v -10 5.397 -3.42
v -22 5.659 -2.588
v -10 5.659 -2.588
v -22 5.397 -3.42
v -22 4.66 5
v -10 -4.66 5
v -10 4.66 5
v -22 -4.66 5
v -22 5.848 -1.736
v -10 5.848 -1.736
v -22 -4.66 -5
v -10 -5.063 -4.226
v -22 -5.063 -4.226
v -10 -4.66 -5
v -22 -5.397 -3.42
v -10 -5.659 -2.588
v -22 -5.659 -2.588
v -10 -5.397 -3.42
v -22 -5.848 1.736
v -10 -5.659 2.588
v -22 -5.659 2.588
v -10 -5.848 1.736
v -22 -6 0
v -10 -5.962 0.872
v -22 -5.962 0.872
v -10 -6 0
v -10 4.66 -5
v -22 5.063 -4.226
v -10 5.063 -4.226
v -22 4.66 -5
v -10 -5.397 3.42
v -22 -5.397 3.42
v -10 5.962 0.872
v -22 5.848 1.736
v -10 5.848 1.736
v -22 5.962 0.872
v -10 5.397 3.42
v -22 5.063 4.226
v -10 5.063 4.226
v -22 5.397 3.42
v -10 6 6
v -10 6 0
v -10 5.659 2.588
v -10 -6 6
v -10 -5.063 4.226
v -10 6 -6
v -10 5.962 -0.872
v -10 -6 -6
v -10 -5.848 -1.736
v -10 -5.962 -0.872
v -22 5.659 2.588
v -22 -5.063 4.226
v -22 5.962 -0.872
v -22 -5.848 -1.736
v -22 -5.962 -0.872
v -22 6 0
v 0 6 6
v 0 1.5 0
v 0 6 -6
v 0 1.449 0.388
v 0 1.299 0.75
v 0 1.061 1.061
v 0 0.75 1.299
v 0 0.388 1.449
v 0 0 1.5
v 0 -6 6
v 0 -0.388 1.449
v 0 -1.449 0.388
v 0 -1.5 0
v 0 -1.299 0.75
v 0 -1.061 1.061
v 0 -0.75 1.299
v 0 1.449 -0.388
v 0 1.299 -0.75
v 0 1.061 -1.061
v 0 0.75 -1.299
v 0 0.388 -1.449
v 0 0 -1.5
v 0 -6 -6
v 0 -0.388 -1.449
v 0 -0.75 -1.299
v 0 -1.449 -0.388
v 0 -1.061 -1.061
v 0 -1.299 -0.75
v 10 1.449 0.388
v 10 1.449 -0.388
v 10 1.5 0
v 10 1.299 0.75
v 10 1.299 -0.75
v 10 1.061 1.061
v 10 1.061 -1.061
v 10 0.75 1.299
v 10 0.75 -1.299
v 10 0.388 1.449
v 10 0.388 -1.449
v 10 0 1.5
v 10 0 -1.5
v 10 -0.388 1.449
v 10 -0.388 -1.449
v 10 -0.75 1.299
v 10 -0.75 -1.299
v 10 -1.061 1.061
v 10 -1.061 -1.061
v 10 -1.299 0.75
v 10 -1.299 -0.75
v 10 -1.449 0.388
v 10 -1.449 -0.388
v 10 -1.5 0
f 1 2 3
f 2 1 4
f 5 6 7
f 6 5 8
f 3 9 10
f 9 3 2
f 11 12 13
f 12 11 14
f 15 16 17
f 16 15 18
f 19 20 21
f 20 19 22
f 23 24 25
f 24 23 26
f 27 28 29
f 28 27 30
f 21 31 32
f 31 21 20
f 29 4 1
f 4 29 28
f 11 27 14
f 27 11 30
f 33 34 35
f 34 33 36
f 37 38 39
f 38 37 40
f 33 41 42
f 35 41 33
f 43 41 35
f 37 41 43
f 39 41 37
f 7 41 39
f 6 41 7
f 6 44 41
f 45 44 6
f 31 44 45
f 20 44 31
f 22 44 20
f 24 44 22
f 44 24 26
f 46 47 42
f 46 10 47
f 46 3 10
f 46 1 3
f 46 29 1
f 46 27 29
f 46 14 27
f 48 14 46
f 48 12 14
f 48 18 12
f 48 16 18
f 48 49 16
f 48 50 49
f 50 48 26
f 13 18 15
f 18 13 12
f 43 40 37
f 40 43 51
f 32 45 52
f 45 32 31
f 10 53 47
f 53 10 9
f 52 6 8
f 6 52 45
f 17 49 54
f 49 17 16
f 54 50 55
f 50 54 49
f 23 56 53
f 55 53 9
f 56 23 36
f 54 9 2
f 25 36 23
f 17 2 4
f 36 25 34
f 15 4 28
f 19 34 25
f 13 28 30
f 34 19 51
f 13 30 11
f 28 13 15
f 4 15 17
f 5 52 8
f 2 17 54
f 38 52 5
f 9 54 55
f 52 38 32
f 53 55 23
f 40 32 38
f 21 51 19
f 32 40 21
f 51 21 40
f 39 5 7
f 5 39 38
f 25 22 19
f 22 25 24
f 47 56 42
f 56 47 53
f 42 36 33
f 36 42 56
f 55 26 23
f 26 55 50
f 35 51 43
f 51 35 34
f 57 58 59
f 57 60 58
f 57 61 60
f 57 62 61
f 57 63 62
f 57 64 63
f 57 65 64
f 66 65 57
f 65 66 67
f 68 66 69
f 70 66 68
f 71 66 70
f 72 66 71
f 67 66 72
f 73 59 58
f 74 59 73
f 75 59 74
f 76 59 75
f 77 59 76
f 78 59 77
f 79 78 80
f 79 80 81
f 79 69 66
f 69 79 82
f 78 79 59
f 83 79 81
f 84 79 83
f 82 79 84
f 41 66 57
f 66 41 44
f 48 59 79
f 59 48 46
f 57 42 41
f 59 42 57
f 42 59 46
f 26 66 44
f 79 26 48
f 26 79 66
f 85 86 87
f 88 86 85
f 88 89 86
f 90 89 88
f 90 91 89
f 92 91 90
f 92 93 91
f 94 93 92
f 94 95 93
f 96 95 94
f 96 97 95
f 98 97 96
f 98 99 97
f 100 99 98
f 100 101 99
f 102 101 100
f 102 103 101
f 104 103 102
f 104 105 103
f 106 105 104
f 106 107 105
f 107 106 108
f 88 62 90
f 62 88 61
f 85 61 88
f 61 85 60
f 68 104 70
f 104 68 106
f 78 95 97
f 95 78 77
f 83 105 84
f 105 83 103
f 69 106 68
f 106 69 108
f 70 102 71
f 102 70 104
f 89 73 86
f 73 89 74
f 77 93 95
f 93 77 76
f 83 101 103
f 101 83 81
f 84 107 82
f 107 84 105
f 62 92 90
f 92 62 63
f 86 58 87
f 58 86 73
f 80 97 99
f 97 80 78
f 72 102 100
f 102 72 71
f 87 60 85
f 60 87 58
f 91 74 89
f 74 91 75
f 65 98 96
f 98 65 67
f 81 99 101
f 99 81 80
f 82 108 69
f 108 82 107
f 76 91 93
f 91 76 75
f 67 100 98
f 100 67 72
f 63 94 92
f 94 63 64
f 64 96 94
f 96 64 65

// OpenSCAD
/*
 * N20 gear motor
 */

$fs = 0.4; // millimetres; smallest segment
 
module n20_motor()
{
    motor_w = 12; // Width of motor (x axis)
    motor_h = 10; // motor height
    motor_d = 12;
    motor_d_half = motor_d / 2;
    motor_w_half = motor_w / 2;
    gearbox_w = 10;
    gearbox_w_half = gearbox_w / 2;
    gearbox_h = 12;
    gearbox_d = 12;
    // Oval motor body
    curve_rad = 10;
    translate([-motor_w_half - gearbox_w,0,0])
    rotate([0,90,0]) {
        $fa = 5.0; // more polygons?
        linear_extrude(motor_w, center=true) {
            intersection() {
            
                translate([0, motor_d_half - curve_rad])
                    circle(r=curve_rad);
                translate([0, -motor_d_half + curve_rad])
                    circle(r=curve_rad);
                square([motor_h,motor_d], center=true);
            }
        }
    }
    // Cube gearbox
    translate([- gearbox_w_half, 0,0]) {
        cube([ gearbox_w, gearbox_d, gearbox_h], center=true); 
    }
    // Shaft
    translate([0,0,0]) {
        rotate([0,90,0]) {
            cylinder(h=10, r=1.5);
        }
    }
    

}


n20_motor();
